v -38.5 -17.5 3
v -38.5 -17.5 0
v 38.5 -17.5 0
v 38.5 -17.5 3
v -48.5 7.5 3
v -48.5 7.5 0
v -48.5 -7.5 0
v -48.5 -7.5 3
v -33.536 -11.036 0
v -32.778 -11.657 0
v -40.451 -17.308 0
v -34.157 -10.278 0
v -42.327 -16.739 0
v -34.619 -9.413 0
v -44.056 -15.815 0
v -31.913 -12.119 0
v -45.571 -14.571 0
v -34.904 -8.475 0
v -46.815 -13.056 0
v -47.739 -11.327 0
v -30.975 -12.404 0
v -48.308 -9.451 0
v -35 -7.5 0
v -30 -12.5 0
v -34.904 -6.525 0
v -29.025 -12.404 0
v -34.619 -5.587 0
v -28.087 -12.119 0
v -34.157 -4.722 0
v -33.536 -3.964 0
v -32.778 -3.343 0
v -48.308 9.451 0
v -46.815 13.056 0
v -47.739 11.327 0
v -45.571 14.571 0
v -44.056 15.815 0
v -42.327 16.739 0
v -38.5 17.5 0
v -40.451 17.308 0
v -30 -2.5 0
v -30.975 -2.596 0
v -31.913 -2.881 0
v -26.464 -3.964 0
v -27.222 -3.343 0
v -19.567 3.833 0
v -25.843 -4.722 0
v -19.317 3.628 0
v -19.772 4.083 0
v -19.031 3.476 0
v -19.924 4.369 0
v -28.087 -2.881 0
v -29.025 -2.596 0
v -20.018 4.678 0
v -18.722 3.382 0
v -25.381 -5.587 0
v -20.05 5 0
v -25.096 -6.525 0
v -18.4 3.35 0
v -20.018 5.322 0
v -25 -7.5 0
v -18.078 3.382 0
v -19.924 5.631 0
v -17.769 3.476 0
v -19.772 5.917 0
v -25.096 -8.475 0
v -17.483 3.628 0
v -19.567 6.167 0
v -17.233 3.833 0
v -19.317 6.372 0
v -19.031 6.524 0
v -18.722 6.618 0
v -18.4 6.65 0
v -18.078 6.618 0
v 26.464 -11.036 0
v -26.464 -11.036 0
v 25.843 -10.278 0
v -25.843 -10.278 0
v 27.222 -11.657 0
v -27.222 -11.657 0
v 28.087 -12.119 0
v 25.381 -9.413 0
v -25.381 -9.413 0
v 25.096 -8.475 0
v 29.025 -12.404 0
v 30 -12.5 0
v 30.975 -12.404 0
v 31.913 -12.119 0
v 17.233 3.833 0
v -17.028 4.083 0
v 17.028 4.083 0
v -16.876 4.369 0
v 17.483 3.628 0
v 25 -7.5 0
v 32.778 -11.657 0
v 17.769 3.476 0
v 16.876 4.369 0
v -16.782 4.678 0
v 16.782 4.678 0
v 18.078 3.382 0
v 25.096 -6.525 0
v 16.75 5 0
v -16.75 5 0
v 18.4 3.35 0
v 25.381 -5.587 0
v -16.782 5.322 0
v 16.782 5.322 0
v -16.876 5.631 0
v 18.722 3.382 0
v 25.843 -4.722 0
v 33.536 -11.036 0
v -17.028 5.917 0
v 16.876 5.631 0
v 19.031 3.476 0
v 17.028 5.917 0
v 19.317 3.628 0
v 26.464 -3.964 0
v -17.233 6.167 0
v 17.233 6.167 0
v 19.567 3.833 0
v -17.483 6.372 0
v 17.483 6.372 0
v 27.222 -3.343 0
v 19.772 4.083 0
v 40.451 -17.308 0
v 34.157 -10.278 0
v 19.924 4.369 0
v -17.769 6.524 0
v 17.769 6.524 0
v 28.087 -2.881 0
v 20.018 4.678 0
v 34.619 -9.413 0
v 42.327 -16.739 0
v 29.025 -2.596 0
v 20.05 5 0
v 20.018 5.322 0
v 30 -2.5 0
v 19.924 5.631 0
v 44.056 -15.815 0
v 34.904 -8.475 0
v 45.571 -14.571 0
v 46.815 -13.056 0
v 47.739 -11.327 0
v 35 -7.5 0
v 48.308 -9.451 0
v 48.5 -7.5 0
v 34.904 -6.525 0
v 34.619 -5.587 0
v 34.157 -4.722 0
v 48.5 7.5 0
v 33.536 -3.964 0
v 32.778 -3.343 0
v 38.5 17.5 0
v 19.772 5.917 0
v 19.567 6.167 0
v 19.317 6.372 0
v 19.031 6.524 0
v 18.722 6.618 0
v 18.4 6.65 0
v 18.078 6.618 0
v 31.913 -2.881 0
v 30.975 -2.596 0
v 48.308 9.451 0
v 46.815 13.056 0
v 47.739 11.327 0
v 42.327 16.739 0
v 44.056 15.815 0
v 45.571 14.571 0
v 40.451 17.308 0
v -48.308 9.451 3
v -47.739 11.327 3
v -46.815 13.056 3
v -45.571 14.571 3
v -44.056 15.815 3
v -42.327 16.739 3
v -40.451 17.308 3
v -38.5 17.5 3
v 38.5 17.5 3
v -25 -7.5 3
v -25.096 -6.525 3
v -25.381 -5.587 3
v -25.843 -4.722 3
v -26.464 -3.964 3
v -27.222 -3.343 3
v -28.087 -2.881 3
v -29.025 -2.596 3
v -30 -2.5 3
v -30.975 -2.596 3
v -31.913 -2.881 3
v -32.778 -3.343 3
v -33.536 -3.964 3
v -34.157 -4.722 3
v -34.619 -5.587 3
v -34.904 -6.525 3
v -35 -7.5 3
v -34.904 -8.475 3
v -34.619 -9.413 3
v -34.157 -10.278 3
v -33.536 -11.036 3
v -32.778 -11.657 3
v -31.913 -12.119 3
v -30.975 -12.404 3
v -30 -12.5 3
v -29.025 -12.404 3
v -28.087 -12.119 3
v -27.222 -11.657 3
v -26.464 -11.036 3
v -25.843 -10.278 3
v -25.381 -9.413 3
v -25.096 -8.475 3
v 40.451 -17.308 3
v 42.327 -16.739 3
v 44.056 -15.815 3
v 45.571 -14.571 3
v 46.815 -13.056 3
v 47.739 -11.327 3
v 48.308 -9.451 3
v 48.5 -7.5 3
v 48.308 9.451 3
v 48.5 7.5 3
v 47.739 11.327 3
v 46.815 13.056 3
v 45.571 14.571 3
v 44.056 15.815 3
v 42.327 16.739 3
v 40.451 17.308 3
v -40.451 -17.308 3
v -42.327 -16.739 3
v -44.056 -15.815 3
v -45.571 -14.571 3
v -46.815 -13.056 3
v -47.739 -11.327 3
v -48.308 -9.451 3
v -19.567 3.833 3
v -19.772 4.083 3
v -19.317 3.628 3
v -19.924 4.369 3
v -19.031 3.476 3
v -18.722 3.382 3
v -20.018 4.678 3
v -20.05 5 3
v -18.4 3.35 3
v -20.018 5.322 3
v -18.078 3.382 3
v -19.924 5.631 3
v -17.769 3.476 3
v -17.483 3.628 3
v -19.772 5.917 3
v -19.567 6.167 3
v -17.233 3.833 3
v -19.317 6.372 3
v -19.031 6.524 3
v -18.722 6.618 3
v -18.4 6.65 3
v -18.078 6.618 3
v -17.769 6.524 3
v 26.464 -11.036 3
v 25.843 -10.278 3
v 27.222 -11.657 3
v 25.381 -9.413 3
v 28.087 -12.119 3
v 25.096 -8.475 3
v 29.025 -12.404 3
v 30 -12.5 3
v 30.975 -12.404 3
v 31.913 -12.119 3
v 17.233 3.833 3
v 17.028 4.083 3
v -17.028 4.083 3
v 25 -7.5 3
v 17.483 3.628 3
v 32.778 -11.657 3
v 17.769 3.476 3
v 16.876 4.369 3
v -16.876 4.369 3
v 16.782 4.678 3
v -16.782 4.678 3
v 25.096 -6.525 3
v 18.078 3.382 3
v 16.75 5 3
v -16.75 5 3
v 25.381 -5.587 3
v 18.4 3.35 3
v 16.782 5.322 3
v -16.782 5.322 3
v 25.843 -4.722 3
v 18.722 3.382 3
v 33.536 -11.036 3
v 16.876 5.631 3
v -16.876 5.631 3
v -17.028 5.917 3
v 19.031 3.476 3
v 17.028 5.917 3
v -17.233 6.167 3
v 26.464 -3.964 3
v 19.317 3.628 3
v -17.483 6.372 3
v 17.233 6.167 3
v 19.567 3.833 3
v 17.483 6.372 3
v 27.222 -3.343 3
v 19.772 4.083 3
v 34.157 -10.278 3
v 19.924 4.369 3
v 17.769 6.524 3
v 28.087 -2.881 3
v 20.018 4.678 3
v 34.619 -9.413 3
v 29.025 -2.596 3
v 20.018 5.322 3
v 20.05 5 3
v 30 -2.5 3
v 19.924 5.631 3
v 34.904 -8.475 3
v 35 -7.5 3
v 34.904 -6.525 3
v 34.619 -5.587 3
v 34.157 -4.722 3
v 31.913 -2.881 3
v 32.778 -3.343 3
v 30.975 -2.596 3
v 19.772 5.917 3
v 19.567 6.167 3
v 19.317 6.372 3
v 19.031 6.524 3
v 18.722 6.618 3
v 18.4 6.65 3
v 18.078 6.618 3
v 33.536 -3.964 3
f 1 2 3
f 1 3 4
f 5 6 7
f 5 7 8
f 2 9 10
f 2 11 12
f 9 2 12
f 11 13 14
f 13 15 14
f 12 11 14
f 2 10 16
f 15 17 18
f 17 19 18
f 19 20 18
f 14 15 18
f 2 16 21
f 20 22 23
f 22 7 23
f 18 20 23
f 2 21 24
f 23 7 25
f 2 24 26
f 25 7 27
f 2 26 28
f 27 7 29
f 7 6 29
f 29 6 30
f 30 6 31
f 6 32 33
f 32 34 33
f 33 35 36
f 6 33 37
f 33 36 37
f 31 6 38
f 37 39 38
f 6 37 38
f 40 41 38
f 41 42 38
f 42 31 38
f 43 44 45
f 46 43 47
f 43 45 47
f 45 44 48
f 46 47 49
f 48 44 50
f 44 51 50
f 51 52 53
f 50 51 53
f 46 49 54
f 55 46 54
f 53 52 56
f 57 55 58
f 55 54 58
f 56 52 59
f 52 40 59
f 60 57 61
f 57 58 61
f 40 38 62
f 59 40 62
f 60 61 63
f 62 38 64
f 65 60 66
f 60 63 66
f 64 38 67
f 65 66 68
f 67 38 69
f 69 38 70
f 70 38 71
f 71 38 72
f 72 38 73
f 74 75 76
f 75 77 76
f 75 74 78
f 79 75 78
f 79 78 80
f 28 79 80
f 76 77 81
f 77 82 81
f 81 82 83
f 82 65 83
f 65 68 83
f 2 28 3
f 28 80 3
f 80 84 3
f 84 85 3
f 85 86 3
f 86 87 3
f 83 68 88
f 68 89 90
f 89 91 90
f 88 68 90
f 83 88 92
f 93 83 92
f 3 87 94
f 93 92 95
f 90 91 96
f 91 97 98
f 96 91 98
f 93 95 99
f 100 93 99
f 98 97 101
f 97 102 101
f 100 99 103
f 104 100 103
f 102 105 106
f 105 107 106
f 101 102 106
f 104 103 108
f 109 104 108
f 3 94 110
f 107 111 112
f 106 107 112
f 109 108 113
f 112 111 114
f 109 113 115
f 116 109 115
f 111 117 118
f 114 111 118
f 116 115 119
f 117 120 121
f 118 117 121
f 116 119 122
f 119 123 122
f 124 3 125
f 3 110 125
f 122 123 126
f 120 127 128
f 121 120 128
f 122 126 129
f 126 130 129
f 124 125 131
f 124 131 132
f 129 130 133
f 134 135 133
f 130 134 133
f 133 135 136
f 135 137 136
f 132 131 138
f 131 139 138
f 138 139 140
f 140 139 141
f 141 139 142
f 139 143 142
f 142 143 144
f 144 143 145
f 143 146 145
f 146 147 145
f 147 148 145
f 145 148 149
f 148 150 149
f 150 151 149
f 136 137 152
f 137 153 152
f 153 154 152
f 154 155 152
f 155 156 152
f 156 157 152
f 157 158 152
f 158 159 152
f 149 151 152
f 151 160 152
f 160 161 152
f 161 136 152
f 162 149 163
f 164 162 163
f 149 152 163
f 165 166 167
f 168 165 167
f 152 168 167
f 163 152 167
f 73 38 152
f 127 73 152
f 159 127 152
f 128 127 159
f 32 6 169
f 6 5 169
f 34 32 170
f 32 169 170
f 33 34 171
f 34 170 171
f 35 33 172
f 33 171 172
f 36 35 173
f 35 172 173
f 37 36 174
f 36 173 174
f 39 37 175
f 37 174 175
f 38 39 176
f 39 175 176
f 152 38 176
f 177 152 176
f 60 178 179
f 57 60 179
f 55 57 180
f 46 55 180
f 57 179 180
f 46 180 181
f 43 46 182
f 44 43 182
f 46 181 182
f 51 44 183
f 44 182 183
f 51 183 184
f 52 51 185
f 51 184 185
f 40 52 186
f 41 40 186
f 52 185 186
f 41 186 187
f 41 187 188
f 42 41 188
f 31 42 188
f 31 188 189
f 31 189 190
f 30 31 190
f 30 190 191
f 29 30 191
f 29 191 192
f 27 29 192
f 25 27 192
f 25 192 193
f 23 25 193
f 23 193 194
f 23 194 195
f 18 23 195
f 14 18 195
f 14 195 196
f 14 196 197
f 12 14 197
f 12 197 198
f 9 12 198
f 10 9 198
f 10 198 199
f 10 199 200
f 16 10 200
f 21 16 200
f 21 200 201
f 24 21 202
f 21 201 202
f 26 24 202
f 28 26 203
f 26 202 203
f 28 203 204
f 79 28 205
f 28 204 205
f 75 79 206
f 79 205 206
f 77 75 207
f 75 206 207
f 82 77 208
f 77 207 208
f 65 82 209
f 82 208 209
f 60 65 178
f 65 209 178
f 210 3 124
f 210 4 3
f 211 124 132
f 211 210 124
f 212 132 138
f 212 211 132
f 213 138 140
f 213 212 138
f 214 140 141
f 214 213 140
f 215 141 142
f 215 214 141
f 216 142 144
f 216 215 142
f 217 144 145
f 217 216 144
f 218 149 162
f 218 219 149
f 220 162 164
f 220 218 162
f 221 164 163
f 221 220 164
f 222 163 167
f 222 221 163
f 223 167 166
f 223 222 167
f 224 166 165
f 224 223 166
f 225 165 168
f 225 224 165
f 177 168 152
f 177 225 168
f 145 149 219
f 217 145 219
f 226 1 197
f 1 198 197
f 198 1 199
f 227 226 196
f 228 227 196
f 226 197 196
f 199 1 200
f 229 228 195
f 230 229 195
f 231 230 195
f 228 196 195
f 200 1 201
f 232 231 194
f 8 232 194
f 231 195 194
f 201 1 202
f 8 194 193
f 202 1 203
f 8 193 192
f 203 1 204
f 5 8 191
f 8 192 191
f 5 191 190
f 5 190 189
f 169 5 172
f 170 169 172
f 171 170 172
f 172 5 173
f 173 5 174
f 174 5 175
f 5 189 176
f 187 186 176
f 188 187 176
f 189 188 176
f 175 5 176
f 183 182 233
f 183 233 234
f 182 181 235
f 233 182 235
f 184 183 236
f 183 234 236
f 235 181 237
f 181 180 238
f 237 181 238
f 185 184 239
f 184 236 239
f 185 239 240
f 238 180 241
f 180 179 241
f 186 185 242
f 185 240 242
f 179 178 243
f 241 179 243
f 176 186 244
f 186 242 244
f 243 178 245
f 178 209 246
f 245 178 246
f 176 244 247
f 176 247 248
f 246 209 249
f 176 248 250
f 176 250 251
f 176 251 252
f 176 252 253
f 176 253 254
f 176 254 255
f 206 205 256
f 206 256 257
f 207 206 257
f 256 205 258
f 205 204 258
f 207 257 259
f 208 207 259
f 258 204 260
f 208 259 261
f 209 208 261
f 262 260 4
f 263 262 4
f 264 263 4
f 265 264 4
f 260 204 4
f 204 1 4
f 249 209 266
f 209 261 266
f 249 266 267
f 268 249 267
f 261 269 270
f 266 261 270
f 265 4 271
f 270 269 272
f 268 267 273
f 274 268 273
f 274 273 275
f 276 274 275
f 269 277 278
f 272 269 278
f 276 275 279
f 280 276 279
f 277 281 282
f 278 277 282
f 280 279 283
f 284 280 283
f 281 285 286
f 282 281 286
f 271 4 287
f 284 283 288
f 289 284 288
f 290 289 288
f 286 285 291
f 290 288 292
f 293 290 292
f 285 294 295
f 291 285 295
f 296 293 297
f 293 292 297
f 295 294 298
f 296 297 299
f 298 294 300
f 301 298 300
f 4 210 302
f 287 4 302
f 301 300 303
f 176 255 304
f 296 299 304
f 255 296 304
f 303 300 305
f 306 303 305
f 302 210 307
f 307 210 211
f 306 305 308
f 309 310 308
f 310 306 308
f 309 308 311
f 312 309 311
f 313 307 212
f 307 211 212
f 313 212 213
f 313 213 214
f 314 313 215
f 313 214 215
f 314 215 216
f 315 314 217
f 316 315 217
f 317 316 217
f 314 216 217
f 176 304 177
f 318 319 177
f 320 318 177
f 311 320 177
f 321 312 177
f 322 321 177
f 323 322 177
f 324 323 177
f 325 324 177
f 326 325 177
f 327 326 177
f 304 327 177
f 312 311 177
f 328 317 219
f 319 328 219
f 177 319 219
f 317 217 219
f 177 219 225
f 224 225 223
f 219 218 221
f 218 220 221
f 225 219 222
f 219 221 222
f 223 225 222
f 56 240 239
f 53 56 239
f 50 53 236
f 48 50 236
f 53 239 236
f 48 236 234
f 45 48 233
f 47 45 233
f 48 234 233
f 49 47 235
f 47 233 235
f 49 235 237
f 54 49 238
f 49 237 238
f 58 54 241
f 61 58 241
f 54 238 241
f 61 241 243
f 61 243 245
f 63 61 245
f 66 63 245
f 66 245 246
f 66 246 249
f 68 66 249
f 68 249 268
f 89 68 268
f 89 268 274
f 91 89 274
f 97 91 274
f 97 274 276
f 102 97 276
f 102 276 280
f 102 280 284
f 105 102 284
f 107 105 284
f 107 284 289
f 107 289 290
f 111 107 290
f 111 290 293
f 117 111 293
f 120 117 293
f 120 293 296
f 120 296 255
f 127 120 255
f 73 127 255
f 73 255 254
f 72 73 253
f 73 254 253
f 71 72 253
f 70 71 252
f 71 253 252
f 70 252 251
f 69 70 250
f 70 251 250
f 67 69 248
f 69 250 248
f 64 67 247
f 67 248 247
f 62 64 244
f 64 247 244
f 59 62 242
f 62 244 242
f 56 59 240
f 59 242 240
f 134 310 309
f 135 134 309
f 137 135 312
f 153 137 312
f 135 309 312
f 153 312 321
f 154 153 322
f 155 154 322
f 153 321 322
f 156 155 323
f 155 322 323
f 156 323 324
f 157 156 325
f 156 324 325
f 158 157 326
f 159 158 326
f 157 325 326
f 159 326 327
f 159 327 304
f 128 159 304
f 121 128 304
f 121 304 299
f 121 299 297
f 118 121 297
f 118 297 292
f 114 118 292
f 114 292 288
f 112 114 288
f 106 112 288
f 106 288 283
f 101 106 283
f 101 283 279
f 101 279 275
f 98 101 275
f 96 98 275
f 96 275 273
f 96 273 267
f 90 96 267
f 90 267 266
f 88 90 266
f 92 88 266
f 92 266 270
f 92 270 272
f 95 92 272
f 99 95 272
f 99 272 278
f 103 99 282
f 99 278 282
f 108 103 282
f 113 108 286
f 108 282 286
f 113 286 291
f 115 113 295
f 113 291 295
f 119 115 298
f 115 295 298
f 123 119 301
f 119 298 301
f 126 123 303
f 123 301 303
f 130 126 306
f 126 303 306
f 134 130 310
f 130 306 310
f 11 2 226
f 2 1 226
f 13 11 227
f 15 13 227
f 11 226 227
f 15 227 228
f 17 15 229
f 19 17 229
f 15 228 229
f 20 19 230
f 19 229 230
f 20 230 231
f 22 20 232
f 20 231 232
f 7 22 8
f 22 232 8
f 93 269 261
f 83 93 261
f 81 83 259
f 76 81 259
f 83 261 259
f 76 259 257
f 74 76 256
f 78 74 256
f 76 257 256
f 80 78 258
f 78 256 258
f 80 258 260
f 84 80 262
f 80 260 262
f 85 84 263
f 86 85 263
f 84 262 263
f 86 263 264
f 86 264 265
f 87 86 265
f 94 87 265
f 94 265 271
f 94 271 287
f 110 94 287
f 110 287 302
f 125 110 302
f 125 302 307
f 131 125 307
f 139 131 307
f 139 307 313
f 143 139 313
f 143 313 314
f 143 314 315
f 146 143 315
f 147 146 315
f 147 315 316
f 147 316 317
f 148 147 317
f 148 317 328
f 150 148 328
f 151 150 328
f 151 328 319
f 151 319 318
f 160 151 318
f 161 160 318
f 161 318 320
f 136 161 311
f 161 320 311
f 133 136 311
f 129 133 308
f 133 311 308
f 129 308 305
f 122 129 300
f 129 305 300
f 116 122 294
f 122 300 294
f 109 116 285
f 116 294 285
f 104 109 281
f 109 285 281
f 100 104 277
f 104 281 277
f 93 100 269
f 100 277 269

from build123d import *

# Parameters (mm, degrees)
SKETCH_1_W          = 91
SKETCH_1_H          = 35
EXTRUDE_2_DEPTH     = 3
SKETCH_2_R          = 1.25
CUT_EXTRUDE_1_DEPTH = 3
SKETCH_3_W          = 91
SKETCH_3_H          = 3
EXTRUDE_3_DEPTH     = 12
EXTRUDE_4_DEPTH     = 3
SKETCH_6_R          = 1.25
CUT_EXTRUDE_2_DEPTH = 3
SKETCH_7_W          = 27
SKETCH_7_H          = 35
EXTRUDE_5_DEPTH     = 3
SKETCH_8_R          = 1.25
CUT_EXTRUDE_3_DEPTH = 3
CUT_EXTRUDE_4_DEPTH = 57.669628421
SKETCH_10_R         = 5
CUT_EXTRUDE_5_DEPTH = 57.669628421
FILLET_1_R          = 10
SKETCH_11_R         = 1.65
CUT_EXTRUDE_6_DEPTH = 10
EXTRUDE_START       = -3
SKETCH_12_R         = 1.25
EXTRUDE_6_DEPTH     = 3


with BuildPart() as part:
    # 草图1 → 凸台-拉伸2 (new body)
    with BuildSketch(Plane.XY):
        Rectangle(SKETCH_1_W, SKETCH_1_H)
    extrude(amount=EXTRUDE_2_DEPTH)

    # 草图2 → 切除-拉伸1 (cut)
    with BuildSketch(Plane(origin=(0, 0, 0), x_dir=(-1, 0, 0), z_dir=(0, 0, -1))):
        with Locations((-22.5, 5)):
            Circle(SKETCH_2_R)
        with Locations(Location((22.5, 5, 0), (0, 0, 180))):
            Circle(SKETCH_2_R)
    extrude(amount=-CUT_EXTRUDE_1_DEPTH, mode=Mode.SUBTRACT)

    # 草图3 → 凸台-拉伸3 (add)
    with BuildSketch(Plane(origin=(0, 0, 0), x_dir=(-1, 0, 0), z_dir=(0, 0, -1))):
        with Locations((0, 16)):
            Rectangle(SKETCH_3_W, SKETCH_3_H)
    extrude(amount=EXTRUDE_3_DEPTH)

    # 草图4 → 凸台-拉伸4 (add)
    with BuildSketch(Plane(origin=(45.5, 0, 0), x_dir=(0, 0, -1), z_dir=(1, 0, 0))):
        Polygon((12, 17.5), (24, 17.5), (24, -17.5), (-3, -17.5), (-3, 17.5), align=None)
    extrude(amount=EXTRUDE_4_DEPTH)

    # 草图6 → 切除-拉伸2 (cut)
    with BuildSketch(Plane.ZY.offset(-45.5)):
        with Locations((-20, 9.5)):
            Circle(SKETCH_6_R)
        with Locations(Location((-20, -15.5, 0), (0, 0, 180))):
            Circle(SKETCH_6_R)
    extrude(amount=-CUT_EXTRUDE_2_DEPTH, mode=Mode.SUBTRACT)

    # 草图7 → 凸台-拉伸5 (add)
    with BuildSketch(Plane.ZY.offset(45.5)):
        with Locations((-10.5, 0)):
            Rectangle(SKETCH_7_W, SKETCH_7_H)
    extrude(amount=EXTRUDE_5_DEPTH)

    # 草图8 → 切除-拉伸3 (cut)
    with BuildSketch(Plane.ZY.offset(48.5)):
        with Locations((-20, 9.5)):
            Circle(SKETCH_8_R)
        with Locations(Location((-20, -15.5, 0), (0, 0, 180))):
            Circle(SKETCH_8_R)
    extrude(amount=-CUT_EXTRUDE_3_DEPTH, mode=Mode.SUBTRACT)

    # 草图9 → 切除-拉伸4 (cut)
    with BuildSketch(Plane(origin=(0, 0, 0), x_dir=(-1, 0, 0), z_dir=(0, 0, -1))):
        Polygon((-104.540404499, 43.487772061), (97.135742415, 67.997211031), (114.089056769, -71.503294087), (-87.587090144, -96.012733056), align=None)
    extrude(amount=CUT_EXTRUDE_4_DEPTH, mode=Mode.SUBTRACT)

    # 草图10 → 切除-拉伸5 (cut)
    with BuildSketch(Plane.XY.offset(3)):
        with Locations((-30, -7.5)):
            Circle(SKETCH_10_R)
        with Locations(Location((30, -7.5, 0), (0, 0, 180))):
            Circle(SKETCH_10_R)
    extrude(amount=-CUT_EXTRUDE_5_DEPTH, mode=Mode.SUBTRACT)

    # 圆角1
    fillet_1_edges = [part.edges().sort_by_distance(p)[0] for p in [
        (48.5, -17.5, 1.5),
        (-48.5, 17.5, 1.5),
        (-48.5, -17.5, 1.5),
        (48.5, 17.5, 1.5),
    ]]
    fillet(fillet_1_edges, radius=FILLET_1_R)

    # 草图11 → 切除-拉伸6 (cut)
    with BuildSketch(Plane.XY.offset(3)):
        with Locations((18.4, 5)):
            Circle(SKETCH_11_R)
        with Locations(Location((-18.4, 5, 0), (0, 0, 180))):
            Circle(SKETCH_11_R)
    extrude(amount=-CUT_EXTRUDE_6_DEPTH, mode=Mode.SUBTRACT)

    # 草图12 → 凸台-拉伸6 (add)
    with BuildSketch(Plane.XY.offset(3).offset(EXTRUDE_START)):
        with Locations((22.5, 5)):
            Circle(SKETCH_12_R)
        with Locations((-22.5, 5)):
            Circle(SKETCH_12_R)
    extrude(amount=EXTRUDE_6_DEPTH)


solid = part.part
